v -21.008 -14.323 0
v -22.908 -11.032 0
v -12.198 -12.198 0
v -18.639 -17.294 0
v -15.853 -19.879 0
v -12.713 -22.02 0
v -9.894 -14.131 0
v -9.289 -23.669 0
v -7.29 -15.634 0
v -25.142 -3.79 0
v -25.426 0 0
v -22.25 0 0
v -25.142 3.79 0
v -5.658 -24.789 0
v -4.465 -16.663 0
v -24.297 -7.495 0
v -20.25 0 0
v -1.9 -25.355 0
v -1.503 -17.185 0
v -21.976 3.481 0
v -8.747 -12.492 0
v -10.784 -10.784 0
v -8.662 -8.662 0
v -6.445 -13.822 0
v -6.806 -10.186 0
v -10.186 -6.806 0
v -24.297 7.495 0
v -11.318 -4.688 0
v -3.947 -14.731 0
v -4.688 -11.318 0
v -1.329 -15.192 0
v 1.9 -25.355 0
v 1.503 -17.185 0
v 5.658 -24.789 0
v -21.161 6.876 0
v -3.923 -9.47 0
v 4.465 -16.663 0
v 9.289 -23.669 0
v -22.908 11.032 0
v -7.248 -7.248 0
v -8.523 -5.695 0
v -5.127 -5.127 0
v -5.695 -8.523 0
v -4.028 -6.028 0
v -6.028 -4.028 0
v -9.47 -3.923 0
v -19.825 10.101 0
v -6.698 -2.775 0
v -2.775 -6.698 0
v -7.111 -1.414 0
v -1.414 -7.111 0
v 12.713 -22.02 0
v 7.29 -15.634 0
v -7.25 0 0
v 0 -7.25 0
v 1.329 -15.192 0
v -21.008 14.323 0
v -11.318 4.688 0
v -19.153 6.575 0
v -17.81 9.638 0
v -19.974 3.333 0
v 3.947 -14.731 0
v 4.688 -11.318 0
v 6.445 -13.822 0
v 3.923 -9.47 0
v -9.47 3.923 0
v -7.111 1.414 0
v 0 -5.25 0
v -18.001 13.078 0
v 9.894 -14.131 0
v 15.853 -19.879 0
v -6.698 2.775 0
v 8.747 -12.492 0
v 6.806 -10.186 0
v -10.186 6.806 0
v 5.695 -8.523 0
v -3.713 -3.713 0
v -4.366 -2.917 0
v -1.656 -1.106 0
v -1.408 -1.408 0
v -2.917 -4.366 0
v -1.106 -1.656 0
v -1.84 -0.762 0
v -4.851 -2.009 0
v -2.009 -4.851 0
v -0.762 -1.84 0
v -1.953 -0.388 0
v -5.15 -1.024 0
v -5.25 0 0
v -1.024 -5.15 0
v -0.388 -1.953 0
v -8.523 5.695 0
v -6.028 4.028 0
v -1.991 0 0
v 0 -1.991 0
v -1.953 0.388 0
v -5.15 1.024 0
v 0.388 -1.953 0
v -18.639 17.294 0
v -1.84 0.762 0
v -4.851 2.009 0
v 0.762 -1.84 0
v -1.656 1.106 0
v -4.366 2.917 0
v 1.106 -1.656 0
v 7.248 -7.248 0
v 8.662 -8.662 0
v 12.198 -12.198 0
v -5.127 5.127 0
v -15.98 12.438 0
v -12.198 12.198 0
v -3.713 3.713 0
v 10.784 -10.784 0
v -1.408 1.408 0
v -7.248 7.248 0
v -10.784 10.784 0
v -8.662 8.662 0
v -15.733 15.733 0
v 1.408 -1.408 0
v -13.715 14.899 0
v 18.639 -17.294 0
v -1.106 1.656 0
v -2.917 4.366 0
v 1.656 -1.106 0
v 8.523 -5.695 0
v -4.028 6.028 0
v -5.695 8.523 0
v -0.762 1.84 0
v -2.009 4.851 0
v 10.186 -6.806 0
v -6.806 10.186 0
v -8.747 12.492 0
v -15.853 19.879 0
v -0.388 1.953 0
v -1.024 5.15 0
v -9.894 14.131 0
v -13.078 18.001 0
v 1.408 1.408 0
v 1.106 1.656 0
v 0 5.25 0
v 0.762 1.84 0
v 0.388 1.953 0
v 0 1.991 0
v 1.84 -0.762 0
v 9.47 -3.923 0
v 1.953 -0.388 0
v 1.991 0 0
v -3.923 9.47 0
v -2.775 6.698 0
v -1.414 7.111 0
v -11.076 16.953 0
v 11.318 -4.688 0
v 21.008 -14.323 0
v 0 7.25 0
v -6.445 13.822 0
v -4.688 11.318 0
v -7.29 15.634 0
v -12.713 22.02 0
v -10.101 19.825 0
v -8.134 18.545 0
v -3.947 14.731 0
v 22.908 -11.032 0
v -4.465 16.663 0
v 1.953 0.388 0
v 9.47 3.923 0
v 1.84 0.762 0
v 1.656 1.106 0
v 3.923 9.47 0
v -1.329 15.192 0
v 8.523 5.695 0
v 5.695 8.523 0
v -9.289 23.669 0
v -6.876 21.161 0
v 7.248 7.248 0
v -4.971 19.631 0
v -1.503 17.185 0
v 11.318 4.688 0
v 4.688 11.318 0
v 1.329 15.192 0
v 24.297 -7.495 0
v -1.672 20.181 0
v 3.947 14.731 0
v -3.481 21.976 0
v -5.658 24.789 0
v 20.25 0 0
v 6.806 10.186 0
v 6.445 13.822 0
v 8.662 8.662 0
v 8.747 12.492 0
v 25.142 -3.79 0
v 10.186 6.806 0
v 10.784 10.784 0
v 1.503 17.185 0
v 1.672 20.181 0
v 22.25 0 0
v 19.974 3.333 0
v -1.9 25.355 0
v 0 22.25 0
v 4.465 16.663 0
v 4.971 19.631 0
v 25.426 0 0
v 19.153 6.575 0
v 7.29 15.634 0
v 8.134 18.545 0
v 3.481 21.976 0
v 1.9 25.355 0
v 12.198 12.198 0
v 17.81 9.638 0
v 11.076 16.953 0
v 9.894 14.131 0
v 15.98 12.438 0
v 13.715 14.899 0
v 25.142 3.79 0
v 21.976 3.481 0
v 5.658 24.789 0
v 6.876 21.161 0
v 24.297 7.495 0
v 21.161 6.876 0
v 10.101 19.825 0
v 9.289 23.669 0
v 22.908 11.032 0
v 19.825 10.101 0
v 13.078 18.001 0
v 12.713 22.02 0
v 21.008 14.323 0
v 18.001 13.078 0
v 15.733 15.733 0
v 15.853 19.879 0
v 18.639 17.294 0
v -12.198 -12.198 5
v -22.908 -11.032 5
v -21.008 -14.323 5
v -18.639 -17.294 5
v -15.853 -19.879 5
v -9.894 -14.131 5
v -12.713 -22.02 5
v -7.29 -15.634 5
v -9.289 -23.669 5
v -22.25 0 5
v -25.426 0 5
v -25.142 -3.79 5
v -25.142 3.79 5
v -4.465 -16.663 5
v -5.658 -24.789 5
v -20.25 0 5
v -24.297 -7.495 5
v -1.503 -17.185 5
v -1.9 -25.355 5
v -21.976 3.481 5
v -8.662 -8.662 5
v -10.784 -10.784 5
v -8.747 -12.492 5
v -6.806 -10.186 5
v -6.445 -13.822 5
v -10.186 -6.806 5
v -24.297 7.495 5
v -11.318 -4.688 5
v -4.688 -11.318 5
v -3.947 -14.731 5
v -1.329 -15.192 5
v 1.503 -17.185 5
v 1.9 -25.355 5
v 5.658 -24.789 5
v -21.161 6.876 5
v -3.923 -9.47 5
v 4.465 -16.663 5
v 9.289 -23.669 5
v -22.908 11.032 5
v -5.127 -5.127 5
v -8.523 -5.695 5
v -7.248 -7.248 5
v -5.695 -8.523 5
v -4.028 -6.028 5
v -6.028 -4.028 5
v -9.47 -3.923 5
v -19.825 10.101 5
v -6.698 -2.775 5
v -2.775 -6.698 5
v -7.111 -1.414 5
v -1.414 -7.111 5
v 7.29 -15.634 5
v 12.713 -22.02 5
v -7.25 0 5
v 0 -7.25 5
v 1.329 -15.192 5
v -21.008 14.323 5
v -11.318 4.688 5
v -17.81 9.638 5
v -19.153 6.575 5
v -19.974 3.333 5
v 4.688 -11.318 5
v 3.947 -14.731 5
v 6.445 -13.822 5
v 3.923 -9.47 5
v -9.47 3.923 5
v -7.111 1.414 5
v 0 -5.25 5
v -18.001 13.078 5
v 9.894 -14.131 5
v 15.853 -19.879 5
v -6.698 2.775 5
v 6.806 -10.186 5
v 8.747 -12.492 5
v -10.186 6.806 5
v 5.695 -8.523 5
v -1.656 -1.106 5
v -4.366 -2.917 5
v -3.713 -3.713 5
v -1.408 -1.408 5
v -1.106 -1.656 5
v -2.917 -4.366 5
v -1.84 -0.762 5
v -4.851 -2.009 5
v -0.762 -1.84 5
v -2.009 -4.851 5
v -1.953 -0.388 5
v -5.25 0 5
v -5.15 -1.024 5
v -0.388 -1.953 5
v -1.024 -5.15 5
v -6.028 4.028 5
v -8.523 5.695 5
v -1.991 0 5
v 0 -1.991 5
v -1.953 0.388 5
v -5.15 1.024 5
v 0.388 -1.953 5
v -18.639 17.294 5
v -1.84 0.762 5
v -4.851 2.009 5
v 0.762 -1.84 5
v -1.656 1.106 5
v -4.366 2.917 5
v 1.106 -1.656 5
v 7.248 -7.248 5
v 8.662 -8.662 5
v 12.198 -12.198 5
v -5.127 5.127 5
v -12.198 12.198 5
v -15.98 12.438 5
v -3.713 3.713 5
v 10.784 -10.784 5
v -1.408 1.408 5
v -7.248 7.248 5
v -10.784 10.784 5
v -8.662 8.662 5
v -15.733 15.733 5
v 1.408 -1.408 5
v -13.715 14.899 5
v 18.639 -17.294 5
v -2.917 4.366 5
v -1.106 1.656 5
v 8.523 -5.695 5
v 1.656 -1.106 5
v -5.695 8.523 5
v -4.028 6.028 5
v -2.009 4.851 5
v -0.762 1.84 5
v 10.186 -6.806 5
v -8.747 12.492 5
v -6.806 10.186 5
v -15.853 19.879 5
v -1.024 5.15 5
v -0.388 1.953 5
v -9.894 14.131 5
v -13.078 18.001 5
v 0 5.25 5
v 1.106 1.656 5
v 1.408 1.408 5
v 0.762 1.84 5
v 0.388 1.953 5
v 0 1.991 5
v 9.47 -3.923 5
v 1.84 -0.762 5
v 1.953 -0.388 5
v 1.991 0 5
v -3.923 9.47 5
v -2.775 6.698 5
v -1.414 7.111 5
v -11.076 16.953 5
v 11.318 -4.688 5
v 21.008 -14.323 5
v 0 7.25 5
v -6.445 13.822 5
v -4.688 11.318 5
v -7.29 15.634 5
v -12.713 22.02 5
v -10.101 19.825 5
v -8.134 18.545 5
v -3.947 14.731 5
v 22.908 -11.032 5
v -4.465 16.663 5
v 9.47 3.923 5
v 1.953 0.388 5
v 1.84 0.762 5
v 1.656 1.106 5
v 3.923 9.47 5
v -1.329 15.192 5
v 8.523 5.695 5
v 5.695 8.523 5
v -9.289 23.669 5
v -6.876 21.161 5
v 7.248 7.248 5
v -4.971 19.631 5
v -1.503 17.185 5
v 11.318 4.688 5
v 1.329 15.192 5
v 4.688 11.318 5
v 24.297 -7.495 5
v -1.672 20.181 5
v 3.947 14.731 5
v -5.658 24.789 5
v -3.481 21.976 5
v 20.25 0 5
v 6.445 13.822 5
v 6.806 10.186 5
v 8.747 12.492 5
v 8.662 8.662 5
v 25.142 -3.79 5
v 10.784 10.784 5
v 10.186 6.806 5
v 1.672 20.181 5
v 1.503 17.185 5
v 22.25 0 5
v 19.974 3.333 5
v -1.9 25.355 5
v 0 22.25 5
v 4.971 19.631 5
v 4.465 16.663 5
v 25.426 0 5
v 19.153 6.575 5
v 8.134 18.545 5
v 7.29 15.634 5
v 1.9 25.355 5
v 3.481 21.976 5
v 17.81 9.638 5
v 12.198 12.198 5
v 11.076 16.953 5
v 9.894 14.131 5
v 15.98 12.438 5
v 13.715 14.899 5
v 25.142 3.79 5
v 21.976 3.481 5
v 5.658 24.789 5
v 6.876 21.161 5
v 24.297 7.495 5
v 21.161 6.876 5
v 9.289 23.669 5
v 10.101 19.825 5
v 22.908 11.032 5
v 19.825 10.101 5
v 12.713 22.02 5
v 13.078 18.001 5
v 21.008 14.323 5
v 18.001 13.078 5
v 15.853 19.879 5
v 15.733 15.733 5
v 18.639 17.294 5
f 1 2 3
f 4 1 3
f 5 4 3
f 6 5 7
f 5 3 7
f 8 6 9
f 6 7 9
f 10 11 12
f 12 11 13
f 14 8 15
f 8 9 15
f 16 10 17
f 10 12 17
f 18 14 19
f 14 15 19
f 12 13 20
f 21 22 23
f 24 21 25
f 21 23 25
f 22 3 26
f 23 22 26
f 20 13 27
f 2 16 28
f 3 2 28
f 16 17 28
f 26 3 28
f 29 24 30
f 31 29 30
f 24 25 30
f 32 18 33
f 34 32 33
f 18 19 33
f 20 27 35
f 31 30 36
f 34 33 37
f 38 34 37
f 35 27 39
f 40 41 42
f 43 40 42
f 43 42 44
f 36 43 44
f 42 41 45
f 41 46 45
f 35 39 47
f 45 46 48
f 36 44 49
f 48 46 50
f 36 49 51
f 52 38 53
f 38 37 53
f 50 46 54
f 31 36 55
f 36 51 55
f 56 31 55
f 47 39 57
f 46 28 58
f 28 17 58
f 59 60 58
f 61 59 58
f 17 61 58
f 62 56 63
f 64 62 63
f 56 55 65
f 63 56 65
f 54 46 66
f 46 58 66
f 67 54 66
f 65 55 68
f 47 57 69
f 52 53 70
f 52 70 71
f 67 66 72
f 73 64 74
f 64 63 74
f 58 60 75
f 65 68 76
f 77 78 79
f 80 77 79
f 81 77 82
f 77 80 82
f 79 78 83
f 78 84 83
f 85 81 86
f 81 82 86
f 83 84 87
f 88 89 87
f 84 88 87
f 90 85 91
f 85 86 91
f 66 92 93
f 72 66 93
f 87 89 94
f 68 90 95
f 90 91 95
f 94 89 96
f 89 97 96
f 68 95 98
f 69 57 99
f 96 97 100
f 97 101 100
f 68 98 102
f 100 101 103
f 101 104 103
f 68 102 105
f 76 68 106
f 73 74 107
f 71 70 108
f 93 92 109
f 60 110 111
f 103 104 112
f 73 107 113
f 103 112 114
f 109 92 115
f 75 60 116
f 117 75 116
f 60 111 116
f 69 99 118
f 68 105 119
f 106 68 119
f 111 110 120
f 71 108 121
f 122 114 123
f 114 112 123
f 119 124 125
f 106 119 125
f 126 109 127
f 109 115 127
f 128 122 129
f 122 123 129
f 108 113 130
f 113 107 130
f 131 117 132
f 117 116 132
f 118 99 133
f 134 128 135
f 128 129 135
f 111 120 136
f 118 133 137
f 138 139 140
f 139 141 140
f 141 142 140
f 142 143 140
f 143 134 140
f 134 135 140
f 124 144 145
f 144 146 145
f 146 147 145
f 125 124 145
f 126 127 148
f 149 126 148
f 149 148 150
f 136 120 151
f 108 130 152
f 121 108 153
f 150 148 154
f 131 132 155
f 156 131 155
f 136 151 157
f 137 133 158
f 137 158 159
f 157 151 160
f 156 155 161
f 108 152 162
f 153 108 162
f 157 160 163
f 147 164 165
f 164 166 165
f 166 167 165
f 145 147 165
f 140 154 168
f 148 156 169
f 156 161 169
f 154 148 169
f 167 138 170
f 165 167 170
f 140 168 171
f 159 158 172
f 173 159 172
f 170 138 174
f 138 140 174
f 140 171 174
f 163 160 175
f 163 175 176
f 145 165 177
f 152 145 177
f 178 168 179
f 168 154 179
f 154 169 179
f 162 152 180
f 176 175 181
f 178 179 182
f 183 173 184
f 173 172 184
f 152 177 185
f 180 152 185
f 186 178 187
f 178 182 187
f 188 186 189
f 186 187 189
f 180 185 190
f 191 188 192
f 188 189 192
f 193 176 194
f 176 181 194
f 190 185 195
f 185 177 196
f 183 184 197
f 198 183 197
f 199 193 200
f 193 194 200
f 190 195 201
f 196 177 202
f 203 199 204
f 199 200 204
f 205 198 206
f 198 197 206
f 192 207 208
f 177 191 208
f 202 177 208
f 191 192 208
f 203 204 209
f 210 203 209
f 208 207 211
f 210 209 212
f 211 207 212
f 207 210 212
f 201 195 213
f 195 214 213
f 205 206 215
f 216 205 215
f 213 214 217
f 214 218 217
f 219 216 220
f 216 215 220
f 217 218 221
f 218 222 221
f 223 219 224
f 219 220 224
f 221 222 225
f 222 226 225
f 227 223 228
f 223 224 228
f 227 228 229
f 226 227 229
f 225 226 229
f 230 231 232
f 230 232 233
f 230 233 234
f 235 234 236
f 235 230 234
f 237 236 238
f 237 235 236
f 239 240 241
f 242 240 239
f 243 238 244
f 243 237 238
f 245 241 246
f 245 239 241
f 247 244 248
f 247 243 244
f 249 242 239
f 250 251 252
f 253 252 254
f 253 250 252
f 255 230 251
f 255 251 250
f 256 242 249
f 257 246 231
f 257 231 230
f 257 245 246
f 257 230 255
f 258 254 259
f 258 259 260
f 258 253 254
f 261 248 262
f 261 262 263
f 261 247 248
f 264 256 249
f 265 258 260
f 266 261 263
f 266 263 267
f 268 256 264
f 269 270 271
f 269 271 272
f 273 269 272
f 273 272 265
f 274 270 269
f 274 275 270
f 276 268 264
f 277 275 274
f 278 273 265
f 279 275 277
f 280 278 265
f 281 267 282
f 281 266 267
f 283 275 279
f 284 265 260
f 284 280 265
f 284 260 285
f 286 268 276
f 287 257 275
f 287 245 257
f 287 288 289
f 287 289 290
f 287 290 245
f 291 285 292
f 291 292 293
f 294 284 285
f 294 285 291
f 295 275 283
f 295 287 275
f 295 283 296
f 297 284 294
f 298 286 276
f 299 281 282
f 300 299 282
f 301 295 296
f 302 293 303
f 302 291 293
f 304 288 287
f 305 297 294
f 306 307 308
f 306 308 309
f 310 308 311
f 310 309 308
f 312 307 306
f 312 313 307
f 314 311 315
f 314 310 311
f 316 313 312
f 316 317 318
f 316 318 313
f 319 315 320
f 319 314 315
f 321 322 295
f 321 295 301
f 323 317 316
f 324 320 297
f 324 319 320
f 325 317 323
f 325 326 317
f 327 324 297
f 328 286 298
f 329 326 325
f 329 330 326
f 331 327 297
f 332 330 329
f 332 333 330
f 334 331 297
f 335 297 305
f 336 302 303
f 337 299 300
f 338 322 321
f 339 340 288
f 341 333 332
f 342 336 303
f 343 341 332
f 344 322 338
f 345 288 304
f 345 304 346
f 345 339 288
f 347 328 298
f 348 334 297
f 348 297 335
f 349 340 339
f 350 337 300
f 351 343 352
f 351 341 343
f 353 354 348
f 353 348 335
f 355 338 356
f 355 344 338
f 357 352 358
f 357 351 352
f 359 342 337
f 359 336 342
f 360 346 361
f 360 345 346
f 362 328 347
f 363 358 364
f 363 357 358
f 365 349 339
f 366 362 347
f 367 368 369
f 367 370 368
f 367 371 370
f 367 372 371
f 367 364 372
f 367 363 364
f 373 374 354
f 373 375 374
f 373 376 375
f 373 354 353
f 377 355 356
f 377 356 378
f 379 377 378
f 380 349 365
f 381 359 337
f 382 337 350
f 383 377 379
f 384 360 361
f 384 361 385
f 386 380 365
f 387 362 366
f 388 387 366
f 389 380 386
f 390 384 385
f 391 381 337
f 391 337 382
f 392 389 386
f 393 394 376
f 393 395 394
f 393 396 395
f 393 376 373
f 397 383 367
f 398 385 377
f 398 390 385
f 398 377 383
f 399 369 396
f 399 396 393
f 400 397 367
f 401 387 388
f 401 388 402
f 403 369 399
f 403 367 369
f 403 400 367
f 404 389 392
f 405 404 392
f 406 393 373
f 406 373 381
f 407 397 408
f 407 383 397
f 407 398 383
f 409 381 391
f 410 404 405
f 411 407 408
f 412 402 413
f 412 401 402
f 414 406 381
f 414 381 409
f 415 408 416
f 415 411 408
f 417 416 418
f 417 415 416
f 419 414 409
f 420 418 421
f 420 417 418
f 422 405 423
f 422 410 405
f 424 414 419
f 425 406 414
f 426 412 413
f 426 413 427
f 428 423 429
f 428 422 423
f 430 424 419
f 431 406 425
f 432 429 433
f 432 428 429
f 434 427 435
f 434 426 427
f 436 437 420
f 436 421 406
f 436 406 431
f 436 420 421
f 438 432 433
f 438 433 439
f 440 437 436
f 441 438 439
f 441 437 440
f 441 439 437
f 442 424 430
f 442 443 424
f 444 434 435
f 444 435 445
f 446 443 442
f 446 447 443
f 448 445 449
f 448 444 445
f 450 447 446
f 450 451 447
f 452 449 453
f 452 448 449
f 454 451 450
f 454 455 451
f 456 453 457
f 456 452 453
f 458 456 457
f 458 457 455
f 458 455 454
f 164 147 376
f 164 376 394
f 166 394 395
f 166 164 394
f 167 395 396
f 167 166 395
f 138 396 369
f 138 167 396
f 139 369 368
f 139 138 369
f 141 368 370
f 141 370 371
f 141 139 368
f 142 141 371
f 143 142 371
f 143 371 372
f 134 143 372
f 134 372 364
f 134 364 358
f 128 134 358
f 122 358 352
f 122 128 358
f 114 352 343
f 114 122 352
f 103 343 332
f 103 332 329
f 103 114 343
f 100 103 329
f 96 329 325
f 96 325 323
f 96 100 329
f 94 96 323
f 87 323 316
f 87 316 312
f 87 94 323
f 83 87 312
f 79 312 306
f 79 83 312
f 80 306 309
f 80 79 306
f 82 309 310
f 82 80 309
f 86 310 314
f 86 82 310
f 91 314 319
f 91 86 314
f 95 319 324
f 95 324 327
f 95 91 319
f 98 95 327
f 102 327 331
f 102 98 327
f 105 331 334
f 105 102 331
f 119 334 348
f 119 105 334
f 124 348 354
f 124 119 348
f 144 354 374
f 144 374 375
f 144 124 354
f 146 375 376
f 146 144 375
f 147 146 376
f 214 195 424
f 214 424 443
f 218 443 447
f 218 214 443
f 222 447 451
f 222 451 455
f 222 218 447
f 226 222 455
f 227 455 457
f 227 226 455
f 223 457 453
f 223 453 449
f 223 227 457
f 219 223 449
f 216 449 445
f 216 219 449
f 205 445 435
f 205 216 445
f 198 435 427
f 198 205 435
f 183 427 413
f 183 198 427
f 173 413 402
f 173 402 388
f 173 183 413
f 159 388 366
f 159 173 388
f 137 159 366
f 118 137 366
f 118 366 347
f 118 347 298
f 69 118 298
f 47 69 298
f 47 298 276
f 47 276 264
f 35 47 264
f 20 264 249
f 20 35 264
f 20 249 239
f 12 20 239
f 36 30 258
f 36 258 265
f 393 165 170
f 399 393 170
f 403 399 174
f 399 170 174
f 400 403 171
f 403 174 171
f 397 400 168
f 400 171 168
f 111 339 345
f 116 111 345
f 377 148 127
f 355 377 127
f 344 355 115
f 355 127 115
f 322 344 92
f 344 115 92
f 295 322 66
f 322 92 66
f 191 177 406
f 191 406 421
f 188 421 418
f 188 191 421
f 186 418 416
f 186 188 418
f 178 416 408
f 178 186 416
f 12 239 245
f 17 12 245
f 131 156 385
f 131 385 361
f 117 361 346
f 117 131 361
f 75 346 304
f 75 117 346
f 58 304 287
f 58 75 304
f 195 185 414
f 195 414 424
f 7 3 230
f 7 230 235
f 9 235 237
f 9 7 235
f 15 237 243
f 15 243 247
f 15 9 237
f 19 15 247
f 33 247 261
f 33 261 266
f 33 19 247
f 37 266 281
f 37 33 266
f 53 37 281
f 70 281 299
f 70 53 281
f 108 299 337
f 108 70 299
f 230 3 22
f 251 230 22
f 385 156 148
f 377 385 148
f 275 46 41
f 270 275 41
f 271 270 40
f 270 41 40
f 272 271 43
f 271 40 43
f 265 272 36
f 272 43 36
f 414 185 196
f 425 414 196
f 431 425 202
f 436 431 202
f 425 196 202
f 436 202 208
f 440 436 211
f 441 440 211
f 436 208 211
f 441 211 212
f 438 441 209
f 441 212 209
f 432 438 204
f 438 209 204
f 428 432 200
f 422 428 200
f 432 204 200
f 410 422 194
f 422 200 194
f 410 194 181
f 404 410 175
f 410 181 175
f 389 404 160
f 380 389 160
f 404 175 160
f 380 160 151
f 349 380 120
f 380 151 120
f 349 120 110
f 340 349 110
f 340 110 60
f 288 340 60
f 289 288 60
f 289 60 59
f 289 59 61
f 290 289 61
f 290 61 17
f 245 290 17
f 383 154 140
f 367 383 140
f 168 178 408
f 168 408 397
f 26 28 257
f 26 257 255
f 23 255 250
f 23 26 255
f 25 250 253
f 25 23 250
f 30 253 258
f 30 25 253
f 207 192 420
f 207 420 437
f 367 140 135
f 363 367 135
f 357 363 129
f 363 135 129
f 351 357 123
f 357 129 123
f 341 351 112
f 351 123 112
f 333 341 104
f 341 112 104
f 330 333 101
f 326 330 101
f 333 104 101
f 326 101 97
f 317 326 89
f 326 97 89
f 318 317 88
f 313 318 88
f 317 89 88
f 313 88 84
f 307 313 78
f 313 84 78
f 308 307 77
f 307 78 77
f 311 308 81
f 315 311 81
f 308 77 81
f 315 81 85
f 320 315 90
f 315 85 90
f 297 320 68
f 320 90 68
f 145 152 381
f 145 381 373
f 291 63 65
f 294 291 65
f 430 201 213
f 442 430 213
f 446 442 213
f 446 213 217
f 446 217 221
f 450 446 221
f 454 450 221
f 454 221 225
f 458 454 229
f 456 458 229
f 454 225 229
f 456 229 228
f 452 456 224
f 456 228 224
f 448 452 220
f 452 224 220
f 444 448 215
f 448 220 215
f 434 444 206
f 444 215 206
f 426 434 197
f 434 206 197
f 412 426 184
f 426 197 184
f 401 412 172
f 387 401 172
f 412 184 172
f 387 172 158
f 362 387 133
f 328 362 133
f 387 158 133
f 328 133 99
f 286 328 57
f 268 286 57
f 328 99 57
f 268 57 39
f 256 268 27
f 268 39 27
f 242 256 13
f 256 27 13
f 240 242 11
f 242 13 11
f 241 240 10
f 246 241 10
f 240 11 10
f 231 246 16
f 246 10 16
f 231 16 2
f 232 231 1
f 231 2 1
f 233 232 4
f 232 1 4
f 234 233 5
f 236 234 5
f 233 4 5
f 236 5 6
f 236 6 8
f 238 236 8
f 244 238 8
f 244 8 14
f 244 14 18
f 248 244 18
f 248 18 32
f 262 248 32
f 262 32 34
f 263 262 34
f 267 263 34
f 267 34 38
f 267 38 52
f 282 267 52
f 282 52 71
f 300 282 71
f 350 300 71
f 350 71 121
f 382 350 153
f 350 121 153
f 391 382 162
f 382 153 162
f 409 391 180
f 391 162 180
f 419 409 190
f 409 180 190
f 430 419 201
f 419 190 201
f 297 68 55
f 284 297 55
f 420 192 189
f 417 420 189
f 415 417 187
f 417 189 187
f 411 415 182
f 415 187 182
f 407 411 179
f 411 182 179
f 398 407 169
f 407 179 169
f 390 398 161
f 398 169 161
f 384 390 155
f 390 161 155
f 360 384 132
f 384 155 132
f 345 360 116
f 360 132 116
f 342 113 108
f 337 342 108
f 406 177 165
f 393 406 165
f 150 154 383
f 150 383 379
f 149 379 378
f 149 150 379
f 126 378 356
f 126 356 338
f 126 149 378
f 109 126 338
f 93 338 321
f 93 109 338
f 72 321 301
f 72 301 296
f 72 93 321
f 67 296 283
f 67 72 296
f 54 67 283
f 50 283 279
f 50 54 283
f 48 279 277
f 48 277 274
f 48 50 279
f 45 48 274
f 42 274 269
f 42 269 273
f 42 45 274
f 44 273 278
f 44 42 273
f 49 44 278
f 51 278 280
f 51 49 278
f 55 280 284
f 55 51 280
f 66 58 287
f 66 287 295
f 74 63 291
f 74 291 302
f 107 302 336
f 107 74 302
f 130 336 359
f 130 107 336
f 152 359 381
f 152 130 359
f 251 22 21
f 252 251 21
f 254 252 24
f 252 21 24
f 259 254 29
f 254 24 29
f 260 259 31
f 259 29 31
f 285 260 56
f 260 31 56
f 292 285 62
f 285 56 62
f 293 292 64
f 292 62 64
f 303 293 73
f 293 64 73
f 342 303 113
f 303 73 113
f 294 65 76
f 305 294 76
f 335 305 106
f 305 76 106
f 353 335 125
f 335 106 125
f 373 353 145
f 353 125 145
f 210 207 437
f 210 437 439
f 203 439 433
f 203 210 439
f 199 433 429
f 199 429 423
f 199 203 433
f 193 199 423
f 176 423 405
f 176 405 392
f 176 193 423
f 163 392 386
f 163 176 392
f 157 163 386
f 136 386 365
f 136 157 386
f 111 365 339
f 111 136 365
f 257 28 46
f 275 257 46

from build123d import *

# Parameters (mm, degrees)
SKETCH_R   = 25.426446
SKETCH_R_2 = 1.991345
PAD_DEPTH  = 5


with BuildPart() as part:
    # Sketch → Pad (new body)
    with BuildSketch(Plane.XY):
        Circle(SKETCH_R)
        Circle(SKETCH_R_2, mode=Mode.SUBTRACT)
        with BuildLine():
            Line((-22.250395, 0), (-20.250395, 0))
            ThreePointArc((20.250395, 0), (0, 20.250395), (-20.250395, 0))
            Line((20.250395, 0), (22.250395, 0))
            ThreePointArc((22.250395, 0), (0, 22.250395), (-22.250395, 0))
        make_face(mode=Mode.SUBTRACT)
        with BuildLine():
            ThreePointArc((12.197871, 12.197871), (0, 17.250395), (-12.197871, 12.197871))
            Line((-12.197871, 12.197871), (-10.783657, 10.783657))
            ThreePointArc((10.783657, 10.783657), (0, 15.250395), (-10.783657, 10.783657))
            Line((10.783657, 10.783657), (12.197871, 12.197871))
        make_face(mode=Mode.SUBTRACT)
        with BuildLine():
            Line((10.783657, -10.783657), (12.197871, -12.197871))
            ThreePointArc((-12.197871, -12.197871), (0, -17.250395), (12.197871, -12.197871))
            Line((-12.197871, -12.197871), (-10.783657, -10.783657))
            ThreePointArc((-10.783657, -10.783657), (0, -15.250395), (10.783657, -10.783657))
        make_face(mode=Mode.SUBTRACT)
        with BuildLine():
            ThreePointArc((-4.688023, 11.317889), (-8.662337, 8.662337), (-11.317889, 4.688023))
            Line((-11.317889, 4.688023), (-9.47013, 3.922656))
            ThreePointArc((-3.922656, 9.47013), (-7.248124, 7.248124), (-9.47013, 3.922656))
            Line((-4.688023, 11.317889), (-3.922656, 9.47013))
        make_face(mode=Mode.SUBTRACT)
        with BuildLine():
            ThreePointArc((11.317889, 4.688023), (8.662337, 8.662337), (4.688023, 11.317889))
            Line((4.688023, 11.317889), (3.922656, 9.47013))
            ThreePointArc((9.47013, 3.922656), (7.248124, 7.248124), (3.922656, 9.47013))
            Line((11.317889, 4.688023), (9.47013, 3.922656))
        make_face(mode=Mode.SUBTRACT)
        with BuildLine():
            ThreePointArc((-11.317889, -4.688023), (-8.662337, -8.662337), (-4.688023, -11.317889))
            Line((-4.688023, -11.317889), (-3.922656, -9.47013))
            ThreePointArc((-9.47013, -3.922656), (-7.248124, -7.248124), (-3.922656, -9.47013))
            Line((-11.317889, -4.688023), (-9.47013, -3.922656))
        make_face(mode=Mode.SUBTRACT)
        with BuildLine():
            ThreePointArc((3.922656, -9.47013), (7.248124, -7.248124), (9.47013, -3.922656))
            Line((11.317889, -4.688023), (9.47013, -3.922656))
            ThreePointArc((4.688023, -11.317889), (8.662337, -8.662337), (11.317889, -4.688023))
            Line((4.688023, -11.317889), (3.922656, -9.47013))
        make_face(mode=Mode.SUBTRACT)
        with BuildLine():
            ThreePointArc((0, 7.250395), (-7.250395, 0), (0, -7.250395))
            Line((0, -5.250395), (0, -7.250395))
            ThreePointArc((0, 5.250395), (-5.250395, 0), (0, -5.250395))
            Line((0, 7.250395), (0, 5.250395))
        make_face(mode=Mode.SUBTRACT)
    extrude(amount=PAD_DEPTH)


solid = part.part
